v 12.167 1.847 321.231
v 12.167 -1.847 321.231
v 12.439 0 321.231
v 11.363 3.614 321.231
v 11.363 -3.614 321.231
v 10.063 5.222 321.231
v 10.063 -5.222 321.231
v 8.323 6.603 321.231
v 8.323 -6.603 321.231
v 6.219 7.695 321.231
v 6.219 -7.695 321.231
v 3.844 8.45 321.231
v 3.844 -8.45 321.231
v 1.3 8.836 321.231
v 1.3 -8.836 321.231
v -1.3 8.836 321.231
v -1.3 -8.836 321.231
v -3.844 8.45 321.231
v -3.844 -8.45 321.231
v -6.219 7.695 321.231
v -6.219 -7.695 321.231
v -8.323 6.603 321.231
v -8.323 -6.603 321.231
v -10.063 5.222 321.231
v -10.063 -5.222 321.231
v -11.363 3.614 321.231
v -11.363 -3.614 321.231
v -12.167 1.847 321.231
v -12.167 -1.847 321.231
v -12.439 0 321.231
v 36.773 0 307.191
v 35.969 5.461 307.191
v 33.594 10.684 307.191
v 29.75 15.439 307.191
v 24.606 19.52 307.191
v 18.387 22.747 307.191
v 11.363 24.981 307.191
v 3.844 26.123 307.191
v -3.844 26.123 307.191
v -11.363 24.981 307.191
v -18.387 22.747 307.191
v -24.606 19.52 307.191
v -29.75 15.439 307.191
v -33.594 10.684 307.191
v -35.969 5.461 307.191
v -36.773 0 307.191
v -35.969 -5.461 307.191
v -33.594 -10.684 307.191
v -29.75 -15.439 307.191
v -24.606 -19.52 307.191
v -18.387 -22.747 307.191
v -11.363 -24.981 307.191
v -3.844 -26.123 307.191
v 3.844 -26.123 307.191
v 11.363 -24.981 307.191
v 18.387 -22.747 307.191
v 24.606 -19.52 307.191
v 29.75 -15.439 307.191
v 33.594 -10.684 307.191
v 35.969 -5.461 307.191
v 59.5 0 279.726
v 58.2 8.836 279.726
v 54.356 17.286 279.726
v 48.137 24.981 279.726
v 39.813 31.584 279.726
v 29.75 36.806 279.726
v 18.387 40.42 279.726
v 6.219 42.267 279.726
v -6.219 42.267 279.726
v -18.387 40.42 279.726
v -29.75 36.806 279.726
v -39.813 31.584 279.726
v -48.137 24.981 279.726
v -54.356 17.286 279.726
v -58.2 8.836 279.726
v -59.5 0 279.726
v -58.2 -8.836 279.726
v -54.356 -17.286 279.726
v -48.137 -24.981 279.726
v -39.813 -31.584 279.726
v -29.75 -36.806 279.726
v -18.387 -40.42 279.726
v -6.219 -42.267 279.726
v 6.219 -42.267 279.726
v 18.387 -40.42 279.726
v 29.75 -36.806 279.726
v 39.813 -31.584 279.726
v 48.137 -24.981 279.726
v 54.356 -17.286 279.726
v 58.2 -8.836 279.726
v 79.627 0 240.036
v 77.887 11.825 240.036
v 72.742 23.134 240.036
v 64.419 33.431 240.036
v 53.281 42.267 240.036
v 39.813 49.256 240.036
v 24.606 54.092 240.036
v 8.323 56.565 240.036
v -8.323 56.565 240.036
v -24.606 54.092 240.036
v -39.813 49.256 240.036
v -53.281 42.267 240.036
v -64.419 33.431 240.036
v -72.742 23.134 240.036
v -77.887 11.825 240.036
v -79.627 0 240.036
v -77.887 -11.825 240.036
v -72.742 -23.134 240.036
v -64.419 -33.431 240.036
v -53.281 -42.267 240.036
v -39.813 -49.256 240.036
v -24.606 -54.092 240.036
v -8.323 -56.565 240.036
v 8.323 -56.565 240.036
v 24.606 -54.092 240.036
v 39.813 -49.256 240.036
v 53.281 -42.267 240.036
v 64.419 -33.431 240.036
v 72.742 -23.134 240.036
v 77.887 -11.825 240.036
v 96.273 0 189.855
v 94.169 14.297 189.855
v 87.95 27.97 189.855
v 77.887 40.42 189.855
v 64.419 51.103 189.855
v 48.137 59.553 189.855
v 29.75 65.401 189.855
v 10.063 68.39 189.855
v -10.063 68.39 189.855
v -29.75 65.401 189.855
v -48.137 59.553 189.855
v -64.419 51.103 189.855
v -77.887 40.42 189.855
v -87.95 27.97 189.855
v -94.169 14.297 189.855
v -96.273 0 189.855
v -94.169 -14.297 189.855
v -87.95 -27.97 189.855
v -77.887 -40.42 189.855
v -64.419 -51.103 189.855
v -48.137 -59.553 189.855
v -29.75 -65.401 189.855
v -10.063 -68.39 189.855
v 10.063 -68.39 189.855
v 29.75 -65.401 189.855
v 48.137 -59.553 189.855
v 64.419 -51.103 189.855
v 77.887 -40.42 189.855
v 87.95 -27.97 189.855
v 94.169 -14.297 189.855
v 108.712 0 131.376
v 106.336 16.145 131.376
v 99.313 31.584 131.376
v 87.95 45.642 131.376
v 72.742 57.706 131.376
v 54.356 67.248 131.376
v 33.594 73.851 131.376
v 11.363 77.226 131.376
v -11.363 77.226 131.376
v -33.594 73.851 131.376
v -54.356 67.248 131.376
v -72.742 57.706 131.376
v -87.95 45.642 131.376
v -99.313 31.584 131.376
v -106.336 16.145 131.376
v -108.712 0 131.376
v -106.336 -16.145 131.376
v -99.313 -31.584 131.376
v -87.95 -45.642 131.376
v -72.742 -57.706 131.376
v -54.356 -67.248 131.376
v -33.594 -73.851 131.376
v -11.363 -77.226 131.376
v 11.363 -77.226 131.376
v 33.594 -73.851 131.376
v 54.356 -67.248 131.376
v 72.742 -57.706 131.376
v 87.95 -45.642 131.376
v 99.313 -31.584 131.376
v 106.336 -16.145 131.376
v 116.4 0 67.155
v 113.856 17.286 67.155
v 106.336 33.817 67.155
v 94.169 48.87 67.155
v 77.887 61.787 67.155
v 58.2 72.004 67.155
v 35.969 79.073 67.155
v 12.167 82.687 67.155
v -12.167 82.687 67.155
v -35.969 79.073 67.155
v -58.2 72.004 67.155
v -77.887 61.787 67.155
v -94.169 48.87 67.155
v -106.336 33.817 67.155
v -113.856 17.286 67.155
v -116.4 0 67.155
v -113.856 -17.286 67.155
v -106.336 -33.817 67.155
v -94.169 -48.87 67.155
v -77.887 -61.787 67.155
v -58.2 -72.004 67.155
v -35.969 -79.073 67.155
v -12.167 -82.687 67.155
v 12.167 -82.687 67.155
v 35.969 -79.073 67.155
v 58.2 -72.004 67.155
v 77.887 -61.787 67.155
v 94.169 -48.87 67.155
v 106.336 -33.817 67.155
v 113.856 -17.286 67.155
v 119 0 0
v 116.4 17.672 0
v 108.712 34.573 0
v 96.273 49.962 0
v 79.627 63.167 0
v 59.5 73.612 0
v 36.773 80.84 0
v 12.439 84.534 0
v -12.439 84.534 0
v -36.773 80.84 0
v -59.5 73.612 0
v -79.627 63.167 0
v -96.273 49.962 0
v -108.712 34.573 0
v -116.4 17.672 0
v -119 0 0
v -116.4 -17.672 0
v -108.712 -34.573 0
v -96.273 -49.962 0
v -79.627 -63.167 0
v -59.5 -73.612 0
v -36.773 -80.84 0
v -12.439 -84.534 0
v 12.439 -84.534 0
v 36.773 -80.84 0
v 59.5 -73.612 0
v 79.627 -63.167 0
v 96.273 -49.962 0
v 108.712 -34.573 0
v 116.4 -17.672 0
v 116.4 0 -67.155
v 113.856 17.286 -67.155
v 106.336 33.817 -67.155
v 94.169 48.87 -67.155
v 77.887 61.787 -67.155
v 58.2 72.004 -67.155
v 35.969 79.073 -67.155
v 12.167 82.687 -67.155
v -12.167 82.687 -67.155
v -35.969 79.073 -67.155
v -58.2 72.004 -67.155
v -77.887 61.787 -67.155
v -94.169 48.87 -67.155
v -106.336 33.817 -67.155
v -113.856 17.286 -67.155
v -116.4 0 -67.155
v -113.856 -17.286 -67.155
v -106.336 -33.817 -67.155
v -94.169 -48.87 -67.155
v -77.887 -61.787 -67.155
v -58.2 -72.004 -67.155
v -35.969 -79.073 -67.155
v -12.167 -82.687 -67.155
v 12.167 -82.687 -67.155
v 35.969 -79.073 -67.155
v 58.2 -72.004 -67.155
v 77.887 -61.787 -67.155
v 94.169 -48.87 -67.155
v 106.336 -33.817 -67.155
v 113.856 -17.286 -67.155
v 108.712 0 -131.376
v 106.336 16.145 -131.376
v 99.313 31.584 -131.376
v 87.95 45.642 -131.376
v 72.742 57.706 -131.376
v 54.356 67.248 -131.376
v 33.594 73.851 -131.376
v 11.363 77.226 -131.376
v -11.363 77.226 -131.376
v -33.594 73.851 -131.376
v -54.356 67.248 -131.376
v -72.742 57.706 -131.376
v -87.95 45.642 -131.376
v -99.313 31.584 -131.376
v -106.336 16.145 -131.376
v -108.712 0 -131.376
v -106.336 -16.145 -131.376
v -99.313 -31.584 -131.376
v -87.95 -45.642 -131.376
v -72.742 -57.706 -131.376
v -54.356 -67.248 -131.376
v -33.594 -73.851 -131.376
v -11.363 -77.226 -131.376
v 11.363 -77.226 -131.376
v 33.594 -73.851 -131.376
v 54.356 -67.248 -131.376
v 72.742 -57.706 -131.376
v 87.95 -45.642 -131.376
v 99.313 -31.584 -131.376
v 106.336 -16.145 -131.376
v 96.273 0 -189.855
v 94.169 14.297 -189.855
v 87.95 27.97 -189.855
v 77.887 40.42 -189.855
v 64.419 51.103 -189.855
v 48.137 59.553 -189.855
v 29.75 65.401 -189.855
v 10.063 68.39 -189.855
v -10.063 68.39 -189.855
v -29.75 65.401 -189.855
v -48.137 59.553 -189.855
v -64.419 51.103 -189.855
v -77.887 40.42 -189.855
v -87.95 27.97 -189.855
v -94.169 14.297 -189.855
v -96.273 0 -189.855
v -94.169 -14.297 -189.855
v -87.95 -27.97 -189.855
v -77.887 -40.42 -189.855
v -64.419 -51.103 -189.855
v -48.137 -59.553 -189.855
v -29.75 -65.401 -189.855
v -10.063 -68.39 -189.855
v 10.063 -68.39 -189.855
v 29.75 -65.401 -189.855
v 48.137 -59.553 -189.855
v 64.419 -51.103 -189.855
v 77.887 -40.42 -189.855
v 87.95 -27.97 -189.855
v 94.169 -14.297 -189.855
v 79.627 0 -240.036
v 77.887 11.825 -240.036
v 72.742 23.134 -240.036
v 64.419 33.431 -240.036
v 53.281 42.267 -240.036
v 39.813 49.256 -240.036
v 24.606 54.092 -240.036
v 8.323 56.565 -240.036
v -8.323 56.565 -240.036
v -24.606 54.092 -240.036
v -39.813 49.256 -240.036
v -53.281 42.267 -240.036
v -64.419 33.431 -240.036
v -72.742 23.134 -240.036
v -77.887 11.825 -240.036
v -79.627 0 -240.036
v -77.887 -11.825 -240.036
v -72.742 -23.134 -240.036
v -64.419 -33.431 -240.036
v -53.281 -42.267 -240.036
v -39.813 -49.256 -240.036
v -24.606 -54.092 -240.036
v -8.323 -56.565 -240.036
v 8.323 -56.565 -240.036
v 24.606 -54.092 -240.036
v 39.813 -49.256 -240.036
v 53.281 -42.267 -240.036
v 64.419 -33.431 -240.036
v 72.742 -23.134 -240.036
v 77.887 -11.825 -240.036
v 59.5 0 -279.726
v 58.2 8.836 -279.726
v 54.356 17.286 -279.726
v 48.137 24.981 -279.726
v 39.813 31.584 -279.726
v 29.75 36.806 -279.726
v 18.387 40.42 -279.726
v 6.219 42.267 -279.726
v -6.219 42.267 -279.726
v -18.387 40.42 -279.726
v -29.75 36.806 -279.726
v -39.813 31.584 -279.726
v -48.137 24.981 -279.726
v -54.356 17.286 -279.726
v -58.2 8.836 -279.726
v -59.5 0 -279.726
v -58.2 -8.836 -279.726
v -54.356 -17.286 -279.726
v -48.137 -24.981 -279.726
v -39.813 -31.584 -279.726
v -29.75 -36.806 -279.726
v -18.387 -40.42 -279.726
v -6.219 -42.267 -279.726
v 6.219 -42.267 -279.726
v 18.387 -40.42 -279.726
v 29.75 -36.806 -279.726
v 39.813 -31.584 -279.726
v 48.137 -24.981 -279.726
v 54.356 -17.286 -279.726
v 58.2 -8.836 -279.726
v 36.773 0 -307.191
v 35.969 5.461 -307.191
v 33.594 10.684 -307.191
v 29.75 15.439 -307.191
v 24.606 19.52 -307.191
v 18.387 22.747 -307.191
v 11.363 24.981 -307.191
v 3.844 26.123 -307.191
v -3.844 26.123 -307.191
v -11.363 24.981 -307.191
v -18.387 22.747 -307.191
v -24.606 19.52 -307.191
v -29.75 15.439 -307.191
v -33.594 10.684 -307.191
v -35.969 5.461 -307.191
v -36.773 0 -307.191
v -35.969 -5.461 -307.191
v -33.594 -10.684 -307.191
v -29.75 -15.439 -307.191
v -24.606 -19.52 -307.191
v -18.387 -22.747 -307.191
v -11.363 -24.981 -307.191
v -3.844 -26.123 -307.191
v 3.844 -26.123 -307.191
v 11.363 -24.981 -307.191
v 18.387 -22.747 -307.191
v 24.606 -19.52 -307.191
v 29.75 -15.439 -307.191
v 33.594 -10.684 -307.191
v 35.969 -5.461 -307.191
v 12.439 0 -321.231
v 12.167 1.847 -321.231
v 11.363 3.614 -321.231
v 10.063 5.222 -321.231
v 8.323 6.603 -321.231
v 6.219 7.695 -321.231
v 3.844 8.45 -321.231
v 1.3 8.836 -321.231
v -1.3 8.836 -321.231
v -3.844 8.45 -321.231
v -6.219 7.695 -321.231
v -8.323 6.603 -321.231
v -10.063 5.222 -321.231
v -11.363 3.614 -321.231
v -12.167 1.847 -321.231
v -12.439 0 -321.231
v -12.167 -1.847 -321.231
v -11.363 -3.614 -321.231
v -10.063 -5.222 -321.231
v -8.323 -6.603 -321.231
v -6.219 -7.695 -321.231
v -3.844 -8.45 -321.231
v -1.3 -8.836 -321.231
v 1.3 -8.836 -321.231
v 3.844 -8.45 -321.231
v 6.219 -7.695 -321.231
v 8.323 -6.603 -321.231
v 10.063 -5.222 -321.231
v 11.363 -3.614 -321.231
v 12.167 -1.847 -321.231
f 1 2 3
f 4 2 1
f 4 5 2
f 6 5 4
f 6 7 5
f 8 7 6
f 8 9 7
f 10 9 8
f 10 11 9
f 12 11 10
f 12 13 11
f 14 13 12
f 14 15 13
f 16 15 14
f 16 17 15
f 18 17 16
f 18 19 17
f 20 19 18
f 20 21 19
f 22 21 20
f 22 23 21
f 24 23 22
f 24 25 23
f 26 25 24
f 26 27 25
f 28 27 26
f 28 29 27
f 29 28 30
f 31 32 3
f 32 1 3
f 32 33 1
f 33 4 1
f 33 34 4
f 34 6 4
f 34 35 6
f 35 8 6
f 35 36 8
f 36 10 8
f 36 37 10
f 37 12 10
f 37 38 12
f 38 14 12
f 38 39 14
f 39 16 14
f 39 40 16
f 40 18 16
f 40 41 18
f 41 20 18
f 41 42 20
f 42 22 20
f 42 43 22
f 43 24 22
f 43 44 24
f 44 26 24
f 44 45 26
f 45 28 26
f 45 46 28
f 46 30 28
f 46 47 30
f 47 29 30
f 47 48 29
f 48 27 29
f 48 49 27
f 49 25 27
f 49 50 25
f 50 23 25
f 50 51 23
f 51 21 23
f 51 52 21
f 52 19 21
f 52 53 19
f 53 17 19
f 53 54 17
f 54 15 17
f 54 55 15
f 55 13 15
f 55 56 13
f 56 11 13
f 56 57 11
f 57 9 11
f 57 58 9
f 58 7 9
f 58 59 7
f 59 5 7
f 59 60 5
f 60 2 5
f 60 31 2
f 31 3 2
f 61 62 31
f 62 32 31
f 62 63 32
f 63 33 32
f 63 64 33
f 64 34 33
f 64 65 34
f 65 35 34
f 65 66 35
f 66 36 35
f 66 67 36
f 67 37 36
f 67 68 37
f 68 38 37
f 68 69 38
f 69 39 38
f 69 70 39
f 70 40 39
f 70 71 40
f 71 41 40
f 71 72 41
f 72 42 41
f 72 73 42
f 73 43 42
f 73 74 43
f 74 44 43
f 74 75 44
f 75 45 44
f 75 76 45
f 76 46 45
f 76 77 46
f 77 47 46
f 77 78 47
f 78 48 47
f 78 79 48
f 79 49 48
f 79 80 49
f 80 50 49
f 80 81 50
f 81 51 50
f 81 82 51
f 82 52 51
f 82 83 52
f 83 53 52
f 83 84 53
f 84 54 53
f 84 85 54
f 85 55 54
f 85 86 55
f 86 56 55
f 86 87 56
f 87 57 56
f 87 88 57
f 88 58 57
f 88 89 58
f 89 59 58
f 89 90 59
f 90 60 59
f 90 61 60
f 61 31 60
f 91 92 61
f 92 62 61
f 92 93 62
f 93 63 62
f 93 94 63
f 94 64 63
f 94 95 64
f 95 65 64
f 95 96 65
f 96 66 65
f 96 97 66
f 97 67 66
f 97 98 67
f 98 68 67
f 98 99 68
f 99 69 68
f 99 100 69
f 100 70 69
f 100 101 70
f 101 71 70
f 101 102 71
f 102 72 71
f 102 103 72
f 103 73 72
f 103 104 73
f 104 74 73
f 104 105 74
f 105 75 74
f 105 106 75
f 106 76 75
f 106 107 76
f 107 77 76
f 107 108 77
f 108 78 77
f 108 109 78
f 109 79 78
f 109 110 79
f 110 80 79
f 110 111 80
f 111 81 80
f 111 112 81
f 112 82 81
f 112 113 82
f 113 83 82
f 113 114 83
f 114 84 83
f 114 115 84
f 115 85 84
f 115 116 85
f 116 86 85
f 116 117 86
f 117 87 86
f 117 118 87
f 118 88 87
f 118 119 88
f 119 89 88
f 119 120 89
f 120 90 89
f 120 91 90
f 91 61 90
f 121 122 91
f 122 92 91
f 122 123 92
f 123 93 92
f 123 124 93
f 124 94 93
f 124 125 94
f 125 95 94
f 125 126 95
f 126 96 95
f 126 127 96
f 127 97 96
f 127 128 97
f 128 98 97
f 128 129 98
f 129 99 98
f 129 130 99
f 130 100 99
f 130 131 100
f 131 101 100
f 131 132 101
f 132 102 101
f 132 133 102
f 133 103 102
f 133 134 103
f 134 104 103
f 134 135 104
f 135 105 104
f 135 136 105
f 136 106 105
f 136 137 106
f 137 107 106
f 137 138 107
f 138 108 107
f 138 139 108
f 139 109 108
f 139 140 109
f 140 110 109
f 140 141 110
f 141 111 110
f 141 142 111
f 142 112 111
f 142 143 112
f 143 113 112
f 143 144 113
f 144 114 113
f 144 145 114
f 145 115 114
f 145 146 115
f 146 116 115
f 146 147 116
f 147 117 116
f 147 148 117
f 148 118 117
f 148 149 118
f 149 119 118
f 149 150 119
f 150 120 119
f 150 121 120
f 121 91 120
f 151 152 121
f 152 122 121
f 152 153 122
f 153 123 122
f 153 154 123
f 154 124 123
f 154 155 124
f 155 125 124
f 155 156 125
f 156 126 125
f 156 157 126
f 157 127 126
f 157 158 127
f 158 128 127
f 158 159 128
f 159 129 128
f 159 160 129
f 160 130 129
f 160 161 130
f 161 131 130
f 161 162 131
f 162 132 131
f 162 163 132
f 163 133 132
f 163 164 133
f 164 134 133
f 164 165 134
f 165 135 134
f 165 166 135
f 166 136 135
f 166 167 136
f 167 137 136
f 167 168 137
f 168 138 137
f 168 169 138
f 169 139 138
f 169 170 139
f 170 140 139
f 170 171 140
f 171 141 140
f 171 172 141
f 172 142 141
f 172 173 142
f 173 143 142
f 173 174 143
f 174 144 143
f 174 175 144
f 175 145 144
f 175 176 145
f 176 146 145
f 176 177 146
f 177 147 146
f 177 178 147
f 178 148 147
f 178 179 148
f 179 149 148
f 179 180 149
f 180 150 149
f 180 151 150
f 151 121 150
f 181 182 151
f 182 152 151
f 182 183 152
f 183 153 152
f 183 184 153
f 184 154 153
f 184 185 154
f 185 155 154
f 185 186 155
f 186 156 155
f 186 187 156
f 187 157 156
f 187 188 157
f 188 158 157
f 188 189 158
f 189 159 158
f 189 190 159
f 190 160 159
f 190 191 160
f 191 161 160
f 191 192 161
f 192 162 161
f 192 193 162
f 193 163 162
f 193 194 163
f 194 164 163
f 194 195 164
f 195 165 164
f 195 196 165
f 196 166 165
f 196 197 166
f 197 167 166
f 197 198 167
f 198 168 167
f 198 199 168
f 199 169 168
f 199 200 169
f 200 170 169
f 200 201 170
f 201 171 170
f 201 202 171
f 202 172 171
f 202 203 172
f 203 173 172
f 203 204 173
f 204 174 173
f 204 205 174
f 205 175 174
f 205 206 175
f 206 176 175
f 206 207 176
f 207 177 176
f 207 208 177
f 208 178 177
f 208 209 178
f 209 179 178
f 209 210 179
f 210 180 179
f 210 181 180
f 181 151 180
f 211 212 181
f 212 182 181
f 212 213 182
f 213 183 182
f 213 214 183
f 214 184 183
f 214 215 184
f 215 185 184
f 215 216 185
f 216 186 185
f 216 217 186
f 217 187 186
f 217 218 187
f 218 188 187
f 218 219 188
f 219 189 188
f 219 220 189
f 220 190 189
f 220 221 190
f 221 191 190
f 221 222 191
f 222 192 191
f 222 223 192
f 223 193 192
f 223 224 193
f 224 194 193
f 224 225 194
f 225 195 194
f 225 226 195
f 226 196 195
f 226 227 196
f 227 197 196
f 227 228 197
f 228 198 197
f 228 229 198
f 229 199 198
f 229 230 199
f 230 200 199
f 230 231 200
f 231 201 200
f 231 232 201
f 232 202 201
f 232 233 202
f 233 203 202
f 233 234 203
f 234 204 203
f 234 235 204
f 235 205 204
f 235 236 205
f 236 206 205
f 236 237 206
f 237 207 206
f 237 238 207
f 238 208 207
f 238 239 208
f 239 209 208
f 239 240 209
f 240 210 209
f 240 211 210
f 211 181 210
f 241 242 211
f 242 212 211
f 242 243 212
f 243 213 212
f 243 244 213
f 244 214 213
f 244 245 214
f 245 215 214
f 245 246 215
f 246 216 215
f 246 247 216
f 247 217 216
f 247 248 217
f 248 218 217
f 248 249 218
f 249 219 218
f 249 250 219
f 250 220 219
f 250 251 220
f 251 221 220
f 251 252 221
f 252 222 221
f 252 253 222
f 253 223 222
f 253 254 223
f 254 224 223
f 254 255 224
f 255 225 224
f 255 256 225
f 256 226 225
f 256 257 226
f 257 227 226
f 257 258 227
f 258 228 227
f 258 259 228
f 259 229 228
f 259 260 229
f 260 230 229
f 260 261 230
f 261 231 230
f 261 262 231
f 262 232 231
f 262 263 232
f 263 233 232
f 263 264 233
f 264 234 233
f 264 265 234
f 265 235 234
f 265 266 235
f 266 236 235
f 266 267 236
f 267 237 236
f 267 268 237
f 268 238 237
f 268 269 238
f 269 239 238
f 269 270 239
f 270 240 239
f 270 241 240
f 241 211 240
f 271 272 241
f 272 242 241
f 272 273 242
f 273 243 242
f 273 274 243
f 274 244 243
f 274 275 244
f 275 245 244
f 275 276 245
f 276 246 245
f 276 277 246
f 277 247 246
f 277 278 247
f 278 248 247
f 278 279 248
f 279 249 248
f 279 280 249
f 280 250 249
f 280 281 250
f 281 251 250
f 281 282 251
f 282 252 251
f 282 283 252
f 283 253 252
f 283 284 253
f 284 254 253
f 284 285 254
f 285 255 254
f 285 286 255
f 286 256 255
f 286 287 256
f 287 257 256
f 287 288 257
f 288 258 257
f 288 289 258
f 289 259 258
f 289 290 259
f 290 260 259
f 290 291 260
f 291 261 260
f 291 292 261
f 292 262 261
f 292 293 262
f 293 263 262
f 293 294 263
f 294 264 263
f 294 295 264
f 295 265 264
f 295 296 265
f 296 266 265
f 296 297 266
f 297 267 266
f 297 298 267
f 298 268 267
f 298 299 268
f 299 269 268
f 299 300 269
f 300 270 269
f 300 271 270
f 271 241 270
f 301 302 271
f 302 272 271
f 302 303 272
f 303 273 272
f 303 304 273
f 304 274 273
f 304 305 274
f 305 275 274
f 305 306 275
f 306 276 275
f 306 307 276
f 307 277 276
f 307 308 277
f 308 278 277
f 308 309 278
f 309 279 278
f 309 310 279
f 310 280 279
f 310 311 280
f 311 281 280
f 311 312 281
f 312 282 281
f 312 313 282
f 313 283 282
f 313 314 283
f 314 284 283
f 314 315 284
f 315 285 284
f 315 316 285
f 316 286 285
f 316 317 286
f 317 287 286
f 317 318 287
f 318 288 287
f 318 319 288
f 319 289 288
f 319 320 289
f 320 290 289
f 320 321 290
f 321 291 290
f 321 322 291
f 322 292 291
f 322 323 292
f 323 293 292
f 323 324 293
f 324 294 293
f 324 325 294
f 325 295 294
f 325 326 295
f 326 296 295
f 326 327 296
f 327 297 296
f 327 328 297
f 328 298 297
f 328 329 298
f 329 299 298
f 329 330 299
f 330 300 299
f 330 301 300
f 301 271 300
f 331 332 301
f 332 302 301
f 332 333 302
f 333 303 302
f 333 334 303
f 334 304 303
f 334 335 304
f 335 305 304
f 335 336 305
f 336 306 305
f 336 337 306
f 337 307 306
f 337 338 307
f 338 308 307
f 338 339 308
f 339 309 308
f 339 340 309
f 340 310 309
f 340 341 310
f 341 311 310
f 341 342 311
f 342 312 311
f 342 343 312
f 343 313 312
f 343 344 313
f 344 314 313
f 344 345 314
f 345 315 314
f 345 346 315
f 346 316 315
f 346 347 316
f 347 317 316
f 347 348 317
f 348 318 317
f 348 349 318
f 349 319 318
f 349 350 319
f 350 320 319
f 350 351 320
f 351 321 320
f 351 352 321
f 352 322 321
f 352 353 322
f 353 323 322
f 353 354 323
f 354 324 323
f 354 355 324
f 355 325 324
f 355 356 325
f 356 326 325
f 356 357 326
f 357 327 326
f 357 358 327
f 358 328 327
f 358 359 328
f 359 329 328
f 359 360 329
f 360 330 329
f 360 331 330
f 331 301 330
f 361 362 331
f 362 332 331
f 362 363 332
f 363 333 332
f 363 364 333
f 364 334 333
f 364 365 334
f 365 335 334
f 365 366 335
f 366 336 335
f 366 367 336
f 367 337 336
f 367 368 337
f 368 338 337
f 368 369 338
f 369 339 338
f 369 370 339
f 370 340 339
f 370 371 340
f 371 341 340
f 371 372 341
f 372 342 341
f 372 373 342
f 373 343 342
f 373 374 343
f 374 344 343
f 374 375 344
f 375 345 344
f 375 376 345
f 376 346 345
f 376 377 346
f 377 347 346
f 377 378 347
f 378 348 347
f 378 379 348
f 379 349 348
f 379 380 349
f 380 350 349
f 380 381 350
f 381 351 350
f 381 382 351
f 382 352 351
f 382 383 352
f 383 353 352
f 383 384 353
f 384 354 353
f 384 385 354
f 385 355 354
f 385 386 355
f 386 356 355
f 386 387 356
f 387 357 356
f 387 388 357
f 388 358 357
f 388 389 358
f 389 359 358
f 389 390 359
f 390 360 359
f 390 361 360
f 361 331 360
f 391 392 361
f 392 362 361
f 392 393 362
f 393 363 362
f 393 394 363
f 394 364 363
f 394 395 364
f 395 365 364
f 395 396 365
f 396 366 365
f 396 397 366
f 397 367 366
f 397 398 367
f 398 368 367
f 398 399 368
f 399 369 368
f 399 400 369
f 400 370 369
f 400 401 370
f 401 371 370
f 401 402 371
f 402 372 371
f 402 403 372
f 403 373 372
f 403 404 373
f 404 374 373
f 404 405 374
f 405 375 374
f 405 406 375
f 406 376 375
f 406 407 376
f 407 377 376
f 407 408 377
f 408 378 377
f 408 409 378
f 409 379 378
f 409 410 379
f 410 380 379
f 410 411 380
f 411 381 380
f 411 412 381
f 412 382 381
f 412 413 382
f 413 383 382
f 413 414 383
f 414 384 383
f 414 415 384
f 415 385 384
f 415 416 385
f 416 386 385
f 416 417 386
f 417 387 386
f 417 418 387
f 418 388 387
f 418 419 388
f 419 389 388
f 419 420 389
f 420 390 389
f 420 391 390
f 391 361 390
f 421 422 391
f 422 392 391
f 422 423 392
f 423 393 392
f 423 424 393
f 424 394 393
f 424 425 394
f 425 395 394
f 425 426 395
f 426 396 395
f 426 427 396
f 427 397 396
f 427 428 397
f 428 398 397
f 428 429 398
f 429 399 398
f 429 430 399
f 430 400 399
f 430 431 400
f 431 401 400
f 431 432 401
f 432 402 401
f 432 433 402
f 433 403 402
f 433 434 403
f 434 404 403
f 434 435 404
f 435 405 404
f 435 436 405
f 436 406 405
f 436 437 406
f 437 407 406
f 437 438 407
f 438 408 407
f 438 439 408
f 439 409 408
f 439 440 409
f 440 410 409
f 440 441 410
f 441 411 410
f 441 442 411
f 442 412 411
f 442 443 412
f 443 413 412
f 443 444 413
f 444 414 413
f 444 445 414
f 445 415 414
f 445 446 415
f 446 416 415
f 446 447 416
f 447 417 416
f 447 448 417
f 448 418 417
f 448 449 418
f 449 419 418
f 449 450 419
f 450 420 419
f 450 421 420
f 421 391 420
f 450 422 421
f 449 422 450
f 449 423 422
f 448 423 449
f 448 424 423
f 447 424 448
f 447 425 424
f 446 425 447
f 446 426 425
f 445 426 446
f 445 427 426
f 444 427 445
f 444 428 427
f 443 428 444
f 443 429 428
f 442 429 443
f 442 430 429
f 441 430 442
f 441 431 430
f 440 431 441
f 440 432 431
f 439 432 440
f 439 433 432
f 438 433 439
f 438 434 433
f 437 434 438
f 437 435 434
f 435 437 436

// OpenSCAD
// Generated by SolidPython 1.0.1 on 2020-07-29 00:46:47


scale(v = [7, 5, 19]) {
	sphere(r = 17);
}
/***********************************************
*********      SolidPython code:      **********
************************************************
 
# import packages: SolidPython
from solid import *
from solid.utils import *
from itertools import chain, combinations, permutations


class Resize:

    def __init__(self, scad_file):
        self.scad_file = scad_file
        #self.scad_file = import_scad(scad_file)
        # cone/cylinder param:
        self.r1 = 0
        self.r2 = 0
        self.h = 0
        # rectangular prism param:
        self.w = 0
        self.l = 0
        # ellipse param:
        self.r = 0

    # import OpenScad code (file name corresponds to shape)


    # classify shape + parameters
    def assign(self, param1, param2, param3):
        if self.scad_file == 'cone.scad':
            self.r1 = param1
            self.r2 = param2
            self.h = param3
        elif self.scad_file == 'cylinder.scad':
            self.r1 = param1
            self.r2 = param2
            self.h = param3
        elif self.scad_file == 'rectangularPrism.scad':
            self.h = param1
            self.l = param2
            self.w = param3
        else:
            self.r = param1
            self.h = param2

    # resize parameters
    def iterate(self):
        x = range(3, 20, 2)
        i = 1
        if self.scad_file == 'cone.scad':
            tempList = list(permutations(x, 2))
            for temp in tempList:
                param1 = temp[0]
                param2 = temp[1]
                filepath = 'produced_scad_files/' + 'cone' + str(param1) + '_' + str(param2) + '_' + '.scad'
                scad_render_to_file(cylinder(h=param1, r1=param2, r2=0), filepath)

        elif self.scad_file == 'cylinder.scad':
            tempList = list(permutations(x, 3))
            for temp in tempList:
                param1 = temp[0]
                param2 = temp[1]
                filepath = 'produced_scad_files/' + 'cylinder' + str(param1) + '_' + str(param2) + '_' + '.scad'
                scad_render_to_file(cylinder(h=param1, r1=param2, r2=param2), filepath)

        elif self.scad_file == 'rectangularPrism.scad':
            tempList = list(permutations(x, 3))
            for temp in tempList:
                param1 = temp[0]
                param2 = temp[1]
                param3 = temp[2]
                filepath = 'produced_scad_files/' + 'rectangularPrism' + str(param1) + '_' + str(param2) + '_' + str(
                    param3) + '.scad'
                scad_render_to_file(cube(size=(param1, param2, param3)), filepath)

        elif self.scad_file == 'ellipse.scad':
            tempList = list(permutations(x, 4))
            for temp in tempList:
                param1 = temp[0]
                param2 = temp[1]
                param3 = temp[2]
                param4 = temp[3]
                filepath = 'produced_scad_files/' + 'ellipse' + str(param1) + '_' + str(param2) + '_' + str(param3) + '_' + str(param4) + '.scad'
                scad_render_to_file(scale([param1, param2, param3])(sphere(r=param4)), filepath)

    def render_to_scadfile(self):
        scad_render_to_file(scad, 'example.scad') 
 
************************************************/
